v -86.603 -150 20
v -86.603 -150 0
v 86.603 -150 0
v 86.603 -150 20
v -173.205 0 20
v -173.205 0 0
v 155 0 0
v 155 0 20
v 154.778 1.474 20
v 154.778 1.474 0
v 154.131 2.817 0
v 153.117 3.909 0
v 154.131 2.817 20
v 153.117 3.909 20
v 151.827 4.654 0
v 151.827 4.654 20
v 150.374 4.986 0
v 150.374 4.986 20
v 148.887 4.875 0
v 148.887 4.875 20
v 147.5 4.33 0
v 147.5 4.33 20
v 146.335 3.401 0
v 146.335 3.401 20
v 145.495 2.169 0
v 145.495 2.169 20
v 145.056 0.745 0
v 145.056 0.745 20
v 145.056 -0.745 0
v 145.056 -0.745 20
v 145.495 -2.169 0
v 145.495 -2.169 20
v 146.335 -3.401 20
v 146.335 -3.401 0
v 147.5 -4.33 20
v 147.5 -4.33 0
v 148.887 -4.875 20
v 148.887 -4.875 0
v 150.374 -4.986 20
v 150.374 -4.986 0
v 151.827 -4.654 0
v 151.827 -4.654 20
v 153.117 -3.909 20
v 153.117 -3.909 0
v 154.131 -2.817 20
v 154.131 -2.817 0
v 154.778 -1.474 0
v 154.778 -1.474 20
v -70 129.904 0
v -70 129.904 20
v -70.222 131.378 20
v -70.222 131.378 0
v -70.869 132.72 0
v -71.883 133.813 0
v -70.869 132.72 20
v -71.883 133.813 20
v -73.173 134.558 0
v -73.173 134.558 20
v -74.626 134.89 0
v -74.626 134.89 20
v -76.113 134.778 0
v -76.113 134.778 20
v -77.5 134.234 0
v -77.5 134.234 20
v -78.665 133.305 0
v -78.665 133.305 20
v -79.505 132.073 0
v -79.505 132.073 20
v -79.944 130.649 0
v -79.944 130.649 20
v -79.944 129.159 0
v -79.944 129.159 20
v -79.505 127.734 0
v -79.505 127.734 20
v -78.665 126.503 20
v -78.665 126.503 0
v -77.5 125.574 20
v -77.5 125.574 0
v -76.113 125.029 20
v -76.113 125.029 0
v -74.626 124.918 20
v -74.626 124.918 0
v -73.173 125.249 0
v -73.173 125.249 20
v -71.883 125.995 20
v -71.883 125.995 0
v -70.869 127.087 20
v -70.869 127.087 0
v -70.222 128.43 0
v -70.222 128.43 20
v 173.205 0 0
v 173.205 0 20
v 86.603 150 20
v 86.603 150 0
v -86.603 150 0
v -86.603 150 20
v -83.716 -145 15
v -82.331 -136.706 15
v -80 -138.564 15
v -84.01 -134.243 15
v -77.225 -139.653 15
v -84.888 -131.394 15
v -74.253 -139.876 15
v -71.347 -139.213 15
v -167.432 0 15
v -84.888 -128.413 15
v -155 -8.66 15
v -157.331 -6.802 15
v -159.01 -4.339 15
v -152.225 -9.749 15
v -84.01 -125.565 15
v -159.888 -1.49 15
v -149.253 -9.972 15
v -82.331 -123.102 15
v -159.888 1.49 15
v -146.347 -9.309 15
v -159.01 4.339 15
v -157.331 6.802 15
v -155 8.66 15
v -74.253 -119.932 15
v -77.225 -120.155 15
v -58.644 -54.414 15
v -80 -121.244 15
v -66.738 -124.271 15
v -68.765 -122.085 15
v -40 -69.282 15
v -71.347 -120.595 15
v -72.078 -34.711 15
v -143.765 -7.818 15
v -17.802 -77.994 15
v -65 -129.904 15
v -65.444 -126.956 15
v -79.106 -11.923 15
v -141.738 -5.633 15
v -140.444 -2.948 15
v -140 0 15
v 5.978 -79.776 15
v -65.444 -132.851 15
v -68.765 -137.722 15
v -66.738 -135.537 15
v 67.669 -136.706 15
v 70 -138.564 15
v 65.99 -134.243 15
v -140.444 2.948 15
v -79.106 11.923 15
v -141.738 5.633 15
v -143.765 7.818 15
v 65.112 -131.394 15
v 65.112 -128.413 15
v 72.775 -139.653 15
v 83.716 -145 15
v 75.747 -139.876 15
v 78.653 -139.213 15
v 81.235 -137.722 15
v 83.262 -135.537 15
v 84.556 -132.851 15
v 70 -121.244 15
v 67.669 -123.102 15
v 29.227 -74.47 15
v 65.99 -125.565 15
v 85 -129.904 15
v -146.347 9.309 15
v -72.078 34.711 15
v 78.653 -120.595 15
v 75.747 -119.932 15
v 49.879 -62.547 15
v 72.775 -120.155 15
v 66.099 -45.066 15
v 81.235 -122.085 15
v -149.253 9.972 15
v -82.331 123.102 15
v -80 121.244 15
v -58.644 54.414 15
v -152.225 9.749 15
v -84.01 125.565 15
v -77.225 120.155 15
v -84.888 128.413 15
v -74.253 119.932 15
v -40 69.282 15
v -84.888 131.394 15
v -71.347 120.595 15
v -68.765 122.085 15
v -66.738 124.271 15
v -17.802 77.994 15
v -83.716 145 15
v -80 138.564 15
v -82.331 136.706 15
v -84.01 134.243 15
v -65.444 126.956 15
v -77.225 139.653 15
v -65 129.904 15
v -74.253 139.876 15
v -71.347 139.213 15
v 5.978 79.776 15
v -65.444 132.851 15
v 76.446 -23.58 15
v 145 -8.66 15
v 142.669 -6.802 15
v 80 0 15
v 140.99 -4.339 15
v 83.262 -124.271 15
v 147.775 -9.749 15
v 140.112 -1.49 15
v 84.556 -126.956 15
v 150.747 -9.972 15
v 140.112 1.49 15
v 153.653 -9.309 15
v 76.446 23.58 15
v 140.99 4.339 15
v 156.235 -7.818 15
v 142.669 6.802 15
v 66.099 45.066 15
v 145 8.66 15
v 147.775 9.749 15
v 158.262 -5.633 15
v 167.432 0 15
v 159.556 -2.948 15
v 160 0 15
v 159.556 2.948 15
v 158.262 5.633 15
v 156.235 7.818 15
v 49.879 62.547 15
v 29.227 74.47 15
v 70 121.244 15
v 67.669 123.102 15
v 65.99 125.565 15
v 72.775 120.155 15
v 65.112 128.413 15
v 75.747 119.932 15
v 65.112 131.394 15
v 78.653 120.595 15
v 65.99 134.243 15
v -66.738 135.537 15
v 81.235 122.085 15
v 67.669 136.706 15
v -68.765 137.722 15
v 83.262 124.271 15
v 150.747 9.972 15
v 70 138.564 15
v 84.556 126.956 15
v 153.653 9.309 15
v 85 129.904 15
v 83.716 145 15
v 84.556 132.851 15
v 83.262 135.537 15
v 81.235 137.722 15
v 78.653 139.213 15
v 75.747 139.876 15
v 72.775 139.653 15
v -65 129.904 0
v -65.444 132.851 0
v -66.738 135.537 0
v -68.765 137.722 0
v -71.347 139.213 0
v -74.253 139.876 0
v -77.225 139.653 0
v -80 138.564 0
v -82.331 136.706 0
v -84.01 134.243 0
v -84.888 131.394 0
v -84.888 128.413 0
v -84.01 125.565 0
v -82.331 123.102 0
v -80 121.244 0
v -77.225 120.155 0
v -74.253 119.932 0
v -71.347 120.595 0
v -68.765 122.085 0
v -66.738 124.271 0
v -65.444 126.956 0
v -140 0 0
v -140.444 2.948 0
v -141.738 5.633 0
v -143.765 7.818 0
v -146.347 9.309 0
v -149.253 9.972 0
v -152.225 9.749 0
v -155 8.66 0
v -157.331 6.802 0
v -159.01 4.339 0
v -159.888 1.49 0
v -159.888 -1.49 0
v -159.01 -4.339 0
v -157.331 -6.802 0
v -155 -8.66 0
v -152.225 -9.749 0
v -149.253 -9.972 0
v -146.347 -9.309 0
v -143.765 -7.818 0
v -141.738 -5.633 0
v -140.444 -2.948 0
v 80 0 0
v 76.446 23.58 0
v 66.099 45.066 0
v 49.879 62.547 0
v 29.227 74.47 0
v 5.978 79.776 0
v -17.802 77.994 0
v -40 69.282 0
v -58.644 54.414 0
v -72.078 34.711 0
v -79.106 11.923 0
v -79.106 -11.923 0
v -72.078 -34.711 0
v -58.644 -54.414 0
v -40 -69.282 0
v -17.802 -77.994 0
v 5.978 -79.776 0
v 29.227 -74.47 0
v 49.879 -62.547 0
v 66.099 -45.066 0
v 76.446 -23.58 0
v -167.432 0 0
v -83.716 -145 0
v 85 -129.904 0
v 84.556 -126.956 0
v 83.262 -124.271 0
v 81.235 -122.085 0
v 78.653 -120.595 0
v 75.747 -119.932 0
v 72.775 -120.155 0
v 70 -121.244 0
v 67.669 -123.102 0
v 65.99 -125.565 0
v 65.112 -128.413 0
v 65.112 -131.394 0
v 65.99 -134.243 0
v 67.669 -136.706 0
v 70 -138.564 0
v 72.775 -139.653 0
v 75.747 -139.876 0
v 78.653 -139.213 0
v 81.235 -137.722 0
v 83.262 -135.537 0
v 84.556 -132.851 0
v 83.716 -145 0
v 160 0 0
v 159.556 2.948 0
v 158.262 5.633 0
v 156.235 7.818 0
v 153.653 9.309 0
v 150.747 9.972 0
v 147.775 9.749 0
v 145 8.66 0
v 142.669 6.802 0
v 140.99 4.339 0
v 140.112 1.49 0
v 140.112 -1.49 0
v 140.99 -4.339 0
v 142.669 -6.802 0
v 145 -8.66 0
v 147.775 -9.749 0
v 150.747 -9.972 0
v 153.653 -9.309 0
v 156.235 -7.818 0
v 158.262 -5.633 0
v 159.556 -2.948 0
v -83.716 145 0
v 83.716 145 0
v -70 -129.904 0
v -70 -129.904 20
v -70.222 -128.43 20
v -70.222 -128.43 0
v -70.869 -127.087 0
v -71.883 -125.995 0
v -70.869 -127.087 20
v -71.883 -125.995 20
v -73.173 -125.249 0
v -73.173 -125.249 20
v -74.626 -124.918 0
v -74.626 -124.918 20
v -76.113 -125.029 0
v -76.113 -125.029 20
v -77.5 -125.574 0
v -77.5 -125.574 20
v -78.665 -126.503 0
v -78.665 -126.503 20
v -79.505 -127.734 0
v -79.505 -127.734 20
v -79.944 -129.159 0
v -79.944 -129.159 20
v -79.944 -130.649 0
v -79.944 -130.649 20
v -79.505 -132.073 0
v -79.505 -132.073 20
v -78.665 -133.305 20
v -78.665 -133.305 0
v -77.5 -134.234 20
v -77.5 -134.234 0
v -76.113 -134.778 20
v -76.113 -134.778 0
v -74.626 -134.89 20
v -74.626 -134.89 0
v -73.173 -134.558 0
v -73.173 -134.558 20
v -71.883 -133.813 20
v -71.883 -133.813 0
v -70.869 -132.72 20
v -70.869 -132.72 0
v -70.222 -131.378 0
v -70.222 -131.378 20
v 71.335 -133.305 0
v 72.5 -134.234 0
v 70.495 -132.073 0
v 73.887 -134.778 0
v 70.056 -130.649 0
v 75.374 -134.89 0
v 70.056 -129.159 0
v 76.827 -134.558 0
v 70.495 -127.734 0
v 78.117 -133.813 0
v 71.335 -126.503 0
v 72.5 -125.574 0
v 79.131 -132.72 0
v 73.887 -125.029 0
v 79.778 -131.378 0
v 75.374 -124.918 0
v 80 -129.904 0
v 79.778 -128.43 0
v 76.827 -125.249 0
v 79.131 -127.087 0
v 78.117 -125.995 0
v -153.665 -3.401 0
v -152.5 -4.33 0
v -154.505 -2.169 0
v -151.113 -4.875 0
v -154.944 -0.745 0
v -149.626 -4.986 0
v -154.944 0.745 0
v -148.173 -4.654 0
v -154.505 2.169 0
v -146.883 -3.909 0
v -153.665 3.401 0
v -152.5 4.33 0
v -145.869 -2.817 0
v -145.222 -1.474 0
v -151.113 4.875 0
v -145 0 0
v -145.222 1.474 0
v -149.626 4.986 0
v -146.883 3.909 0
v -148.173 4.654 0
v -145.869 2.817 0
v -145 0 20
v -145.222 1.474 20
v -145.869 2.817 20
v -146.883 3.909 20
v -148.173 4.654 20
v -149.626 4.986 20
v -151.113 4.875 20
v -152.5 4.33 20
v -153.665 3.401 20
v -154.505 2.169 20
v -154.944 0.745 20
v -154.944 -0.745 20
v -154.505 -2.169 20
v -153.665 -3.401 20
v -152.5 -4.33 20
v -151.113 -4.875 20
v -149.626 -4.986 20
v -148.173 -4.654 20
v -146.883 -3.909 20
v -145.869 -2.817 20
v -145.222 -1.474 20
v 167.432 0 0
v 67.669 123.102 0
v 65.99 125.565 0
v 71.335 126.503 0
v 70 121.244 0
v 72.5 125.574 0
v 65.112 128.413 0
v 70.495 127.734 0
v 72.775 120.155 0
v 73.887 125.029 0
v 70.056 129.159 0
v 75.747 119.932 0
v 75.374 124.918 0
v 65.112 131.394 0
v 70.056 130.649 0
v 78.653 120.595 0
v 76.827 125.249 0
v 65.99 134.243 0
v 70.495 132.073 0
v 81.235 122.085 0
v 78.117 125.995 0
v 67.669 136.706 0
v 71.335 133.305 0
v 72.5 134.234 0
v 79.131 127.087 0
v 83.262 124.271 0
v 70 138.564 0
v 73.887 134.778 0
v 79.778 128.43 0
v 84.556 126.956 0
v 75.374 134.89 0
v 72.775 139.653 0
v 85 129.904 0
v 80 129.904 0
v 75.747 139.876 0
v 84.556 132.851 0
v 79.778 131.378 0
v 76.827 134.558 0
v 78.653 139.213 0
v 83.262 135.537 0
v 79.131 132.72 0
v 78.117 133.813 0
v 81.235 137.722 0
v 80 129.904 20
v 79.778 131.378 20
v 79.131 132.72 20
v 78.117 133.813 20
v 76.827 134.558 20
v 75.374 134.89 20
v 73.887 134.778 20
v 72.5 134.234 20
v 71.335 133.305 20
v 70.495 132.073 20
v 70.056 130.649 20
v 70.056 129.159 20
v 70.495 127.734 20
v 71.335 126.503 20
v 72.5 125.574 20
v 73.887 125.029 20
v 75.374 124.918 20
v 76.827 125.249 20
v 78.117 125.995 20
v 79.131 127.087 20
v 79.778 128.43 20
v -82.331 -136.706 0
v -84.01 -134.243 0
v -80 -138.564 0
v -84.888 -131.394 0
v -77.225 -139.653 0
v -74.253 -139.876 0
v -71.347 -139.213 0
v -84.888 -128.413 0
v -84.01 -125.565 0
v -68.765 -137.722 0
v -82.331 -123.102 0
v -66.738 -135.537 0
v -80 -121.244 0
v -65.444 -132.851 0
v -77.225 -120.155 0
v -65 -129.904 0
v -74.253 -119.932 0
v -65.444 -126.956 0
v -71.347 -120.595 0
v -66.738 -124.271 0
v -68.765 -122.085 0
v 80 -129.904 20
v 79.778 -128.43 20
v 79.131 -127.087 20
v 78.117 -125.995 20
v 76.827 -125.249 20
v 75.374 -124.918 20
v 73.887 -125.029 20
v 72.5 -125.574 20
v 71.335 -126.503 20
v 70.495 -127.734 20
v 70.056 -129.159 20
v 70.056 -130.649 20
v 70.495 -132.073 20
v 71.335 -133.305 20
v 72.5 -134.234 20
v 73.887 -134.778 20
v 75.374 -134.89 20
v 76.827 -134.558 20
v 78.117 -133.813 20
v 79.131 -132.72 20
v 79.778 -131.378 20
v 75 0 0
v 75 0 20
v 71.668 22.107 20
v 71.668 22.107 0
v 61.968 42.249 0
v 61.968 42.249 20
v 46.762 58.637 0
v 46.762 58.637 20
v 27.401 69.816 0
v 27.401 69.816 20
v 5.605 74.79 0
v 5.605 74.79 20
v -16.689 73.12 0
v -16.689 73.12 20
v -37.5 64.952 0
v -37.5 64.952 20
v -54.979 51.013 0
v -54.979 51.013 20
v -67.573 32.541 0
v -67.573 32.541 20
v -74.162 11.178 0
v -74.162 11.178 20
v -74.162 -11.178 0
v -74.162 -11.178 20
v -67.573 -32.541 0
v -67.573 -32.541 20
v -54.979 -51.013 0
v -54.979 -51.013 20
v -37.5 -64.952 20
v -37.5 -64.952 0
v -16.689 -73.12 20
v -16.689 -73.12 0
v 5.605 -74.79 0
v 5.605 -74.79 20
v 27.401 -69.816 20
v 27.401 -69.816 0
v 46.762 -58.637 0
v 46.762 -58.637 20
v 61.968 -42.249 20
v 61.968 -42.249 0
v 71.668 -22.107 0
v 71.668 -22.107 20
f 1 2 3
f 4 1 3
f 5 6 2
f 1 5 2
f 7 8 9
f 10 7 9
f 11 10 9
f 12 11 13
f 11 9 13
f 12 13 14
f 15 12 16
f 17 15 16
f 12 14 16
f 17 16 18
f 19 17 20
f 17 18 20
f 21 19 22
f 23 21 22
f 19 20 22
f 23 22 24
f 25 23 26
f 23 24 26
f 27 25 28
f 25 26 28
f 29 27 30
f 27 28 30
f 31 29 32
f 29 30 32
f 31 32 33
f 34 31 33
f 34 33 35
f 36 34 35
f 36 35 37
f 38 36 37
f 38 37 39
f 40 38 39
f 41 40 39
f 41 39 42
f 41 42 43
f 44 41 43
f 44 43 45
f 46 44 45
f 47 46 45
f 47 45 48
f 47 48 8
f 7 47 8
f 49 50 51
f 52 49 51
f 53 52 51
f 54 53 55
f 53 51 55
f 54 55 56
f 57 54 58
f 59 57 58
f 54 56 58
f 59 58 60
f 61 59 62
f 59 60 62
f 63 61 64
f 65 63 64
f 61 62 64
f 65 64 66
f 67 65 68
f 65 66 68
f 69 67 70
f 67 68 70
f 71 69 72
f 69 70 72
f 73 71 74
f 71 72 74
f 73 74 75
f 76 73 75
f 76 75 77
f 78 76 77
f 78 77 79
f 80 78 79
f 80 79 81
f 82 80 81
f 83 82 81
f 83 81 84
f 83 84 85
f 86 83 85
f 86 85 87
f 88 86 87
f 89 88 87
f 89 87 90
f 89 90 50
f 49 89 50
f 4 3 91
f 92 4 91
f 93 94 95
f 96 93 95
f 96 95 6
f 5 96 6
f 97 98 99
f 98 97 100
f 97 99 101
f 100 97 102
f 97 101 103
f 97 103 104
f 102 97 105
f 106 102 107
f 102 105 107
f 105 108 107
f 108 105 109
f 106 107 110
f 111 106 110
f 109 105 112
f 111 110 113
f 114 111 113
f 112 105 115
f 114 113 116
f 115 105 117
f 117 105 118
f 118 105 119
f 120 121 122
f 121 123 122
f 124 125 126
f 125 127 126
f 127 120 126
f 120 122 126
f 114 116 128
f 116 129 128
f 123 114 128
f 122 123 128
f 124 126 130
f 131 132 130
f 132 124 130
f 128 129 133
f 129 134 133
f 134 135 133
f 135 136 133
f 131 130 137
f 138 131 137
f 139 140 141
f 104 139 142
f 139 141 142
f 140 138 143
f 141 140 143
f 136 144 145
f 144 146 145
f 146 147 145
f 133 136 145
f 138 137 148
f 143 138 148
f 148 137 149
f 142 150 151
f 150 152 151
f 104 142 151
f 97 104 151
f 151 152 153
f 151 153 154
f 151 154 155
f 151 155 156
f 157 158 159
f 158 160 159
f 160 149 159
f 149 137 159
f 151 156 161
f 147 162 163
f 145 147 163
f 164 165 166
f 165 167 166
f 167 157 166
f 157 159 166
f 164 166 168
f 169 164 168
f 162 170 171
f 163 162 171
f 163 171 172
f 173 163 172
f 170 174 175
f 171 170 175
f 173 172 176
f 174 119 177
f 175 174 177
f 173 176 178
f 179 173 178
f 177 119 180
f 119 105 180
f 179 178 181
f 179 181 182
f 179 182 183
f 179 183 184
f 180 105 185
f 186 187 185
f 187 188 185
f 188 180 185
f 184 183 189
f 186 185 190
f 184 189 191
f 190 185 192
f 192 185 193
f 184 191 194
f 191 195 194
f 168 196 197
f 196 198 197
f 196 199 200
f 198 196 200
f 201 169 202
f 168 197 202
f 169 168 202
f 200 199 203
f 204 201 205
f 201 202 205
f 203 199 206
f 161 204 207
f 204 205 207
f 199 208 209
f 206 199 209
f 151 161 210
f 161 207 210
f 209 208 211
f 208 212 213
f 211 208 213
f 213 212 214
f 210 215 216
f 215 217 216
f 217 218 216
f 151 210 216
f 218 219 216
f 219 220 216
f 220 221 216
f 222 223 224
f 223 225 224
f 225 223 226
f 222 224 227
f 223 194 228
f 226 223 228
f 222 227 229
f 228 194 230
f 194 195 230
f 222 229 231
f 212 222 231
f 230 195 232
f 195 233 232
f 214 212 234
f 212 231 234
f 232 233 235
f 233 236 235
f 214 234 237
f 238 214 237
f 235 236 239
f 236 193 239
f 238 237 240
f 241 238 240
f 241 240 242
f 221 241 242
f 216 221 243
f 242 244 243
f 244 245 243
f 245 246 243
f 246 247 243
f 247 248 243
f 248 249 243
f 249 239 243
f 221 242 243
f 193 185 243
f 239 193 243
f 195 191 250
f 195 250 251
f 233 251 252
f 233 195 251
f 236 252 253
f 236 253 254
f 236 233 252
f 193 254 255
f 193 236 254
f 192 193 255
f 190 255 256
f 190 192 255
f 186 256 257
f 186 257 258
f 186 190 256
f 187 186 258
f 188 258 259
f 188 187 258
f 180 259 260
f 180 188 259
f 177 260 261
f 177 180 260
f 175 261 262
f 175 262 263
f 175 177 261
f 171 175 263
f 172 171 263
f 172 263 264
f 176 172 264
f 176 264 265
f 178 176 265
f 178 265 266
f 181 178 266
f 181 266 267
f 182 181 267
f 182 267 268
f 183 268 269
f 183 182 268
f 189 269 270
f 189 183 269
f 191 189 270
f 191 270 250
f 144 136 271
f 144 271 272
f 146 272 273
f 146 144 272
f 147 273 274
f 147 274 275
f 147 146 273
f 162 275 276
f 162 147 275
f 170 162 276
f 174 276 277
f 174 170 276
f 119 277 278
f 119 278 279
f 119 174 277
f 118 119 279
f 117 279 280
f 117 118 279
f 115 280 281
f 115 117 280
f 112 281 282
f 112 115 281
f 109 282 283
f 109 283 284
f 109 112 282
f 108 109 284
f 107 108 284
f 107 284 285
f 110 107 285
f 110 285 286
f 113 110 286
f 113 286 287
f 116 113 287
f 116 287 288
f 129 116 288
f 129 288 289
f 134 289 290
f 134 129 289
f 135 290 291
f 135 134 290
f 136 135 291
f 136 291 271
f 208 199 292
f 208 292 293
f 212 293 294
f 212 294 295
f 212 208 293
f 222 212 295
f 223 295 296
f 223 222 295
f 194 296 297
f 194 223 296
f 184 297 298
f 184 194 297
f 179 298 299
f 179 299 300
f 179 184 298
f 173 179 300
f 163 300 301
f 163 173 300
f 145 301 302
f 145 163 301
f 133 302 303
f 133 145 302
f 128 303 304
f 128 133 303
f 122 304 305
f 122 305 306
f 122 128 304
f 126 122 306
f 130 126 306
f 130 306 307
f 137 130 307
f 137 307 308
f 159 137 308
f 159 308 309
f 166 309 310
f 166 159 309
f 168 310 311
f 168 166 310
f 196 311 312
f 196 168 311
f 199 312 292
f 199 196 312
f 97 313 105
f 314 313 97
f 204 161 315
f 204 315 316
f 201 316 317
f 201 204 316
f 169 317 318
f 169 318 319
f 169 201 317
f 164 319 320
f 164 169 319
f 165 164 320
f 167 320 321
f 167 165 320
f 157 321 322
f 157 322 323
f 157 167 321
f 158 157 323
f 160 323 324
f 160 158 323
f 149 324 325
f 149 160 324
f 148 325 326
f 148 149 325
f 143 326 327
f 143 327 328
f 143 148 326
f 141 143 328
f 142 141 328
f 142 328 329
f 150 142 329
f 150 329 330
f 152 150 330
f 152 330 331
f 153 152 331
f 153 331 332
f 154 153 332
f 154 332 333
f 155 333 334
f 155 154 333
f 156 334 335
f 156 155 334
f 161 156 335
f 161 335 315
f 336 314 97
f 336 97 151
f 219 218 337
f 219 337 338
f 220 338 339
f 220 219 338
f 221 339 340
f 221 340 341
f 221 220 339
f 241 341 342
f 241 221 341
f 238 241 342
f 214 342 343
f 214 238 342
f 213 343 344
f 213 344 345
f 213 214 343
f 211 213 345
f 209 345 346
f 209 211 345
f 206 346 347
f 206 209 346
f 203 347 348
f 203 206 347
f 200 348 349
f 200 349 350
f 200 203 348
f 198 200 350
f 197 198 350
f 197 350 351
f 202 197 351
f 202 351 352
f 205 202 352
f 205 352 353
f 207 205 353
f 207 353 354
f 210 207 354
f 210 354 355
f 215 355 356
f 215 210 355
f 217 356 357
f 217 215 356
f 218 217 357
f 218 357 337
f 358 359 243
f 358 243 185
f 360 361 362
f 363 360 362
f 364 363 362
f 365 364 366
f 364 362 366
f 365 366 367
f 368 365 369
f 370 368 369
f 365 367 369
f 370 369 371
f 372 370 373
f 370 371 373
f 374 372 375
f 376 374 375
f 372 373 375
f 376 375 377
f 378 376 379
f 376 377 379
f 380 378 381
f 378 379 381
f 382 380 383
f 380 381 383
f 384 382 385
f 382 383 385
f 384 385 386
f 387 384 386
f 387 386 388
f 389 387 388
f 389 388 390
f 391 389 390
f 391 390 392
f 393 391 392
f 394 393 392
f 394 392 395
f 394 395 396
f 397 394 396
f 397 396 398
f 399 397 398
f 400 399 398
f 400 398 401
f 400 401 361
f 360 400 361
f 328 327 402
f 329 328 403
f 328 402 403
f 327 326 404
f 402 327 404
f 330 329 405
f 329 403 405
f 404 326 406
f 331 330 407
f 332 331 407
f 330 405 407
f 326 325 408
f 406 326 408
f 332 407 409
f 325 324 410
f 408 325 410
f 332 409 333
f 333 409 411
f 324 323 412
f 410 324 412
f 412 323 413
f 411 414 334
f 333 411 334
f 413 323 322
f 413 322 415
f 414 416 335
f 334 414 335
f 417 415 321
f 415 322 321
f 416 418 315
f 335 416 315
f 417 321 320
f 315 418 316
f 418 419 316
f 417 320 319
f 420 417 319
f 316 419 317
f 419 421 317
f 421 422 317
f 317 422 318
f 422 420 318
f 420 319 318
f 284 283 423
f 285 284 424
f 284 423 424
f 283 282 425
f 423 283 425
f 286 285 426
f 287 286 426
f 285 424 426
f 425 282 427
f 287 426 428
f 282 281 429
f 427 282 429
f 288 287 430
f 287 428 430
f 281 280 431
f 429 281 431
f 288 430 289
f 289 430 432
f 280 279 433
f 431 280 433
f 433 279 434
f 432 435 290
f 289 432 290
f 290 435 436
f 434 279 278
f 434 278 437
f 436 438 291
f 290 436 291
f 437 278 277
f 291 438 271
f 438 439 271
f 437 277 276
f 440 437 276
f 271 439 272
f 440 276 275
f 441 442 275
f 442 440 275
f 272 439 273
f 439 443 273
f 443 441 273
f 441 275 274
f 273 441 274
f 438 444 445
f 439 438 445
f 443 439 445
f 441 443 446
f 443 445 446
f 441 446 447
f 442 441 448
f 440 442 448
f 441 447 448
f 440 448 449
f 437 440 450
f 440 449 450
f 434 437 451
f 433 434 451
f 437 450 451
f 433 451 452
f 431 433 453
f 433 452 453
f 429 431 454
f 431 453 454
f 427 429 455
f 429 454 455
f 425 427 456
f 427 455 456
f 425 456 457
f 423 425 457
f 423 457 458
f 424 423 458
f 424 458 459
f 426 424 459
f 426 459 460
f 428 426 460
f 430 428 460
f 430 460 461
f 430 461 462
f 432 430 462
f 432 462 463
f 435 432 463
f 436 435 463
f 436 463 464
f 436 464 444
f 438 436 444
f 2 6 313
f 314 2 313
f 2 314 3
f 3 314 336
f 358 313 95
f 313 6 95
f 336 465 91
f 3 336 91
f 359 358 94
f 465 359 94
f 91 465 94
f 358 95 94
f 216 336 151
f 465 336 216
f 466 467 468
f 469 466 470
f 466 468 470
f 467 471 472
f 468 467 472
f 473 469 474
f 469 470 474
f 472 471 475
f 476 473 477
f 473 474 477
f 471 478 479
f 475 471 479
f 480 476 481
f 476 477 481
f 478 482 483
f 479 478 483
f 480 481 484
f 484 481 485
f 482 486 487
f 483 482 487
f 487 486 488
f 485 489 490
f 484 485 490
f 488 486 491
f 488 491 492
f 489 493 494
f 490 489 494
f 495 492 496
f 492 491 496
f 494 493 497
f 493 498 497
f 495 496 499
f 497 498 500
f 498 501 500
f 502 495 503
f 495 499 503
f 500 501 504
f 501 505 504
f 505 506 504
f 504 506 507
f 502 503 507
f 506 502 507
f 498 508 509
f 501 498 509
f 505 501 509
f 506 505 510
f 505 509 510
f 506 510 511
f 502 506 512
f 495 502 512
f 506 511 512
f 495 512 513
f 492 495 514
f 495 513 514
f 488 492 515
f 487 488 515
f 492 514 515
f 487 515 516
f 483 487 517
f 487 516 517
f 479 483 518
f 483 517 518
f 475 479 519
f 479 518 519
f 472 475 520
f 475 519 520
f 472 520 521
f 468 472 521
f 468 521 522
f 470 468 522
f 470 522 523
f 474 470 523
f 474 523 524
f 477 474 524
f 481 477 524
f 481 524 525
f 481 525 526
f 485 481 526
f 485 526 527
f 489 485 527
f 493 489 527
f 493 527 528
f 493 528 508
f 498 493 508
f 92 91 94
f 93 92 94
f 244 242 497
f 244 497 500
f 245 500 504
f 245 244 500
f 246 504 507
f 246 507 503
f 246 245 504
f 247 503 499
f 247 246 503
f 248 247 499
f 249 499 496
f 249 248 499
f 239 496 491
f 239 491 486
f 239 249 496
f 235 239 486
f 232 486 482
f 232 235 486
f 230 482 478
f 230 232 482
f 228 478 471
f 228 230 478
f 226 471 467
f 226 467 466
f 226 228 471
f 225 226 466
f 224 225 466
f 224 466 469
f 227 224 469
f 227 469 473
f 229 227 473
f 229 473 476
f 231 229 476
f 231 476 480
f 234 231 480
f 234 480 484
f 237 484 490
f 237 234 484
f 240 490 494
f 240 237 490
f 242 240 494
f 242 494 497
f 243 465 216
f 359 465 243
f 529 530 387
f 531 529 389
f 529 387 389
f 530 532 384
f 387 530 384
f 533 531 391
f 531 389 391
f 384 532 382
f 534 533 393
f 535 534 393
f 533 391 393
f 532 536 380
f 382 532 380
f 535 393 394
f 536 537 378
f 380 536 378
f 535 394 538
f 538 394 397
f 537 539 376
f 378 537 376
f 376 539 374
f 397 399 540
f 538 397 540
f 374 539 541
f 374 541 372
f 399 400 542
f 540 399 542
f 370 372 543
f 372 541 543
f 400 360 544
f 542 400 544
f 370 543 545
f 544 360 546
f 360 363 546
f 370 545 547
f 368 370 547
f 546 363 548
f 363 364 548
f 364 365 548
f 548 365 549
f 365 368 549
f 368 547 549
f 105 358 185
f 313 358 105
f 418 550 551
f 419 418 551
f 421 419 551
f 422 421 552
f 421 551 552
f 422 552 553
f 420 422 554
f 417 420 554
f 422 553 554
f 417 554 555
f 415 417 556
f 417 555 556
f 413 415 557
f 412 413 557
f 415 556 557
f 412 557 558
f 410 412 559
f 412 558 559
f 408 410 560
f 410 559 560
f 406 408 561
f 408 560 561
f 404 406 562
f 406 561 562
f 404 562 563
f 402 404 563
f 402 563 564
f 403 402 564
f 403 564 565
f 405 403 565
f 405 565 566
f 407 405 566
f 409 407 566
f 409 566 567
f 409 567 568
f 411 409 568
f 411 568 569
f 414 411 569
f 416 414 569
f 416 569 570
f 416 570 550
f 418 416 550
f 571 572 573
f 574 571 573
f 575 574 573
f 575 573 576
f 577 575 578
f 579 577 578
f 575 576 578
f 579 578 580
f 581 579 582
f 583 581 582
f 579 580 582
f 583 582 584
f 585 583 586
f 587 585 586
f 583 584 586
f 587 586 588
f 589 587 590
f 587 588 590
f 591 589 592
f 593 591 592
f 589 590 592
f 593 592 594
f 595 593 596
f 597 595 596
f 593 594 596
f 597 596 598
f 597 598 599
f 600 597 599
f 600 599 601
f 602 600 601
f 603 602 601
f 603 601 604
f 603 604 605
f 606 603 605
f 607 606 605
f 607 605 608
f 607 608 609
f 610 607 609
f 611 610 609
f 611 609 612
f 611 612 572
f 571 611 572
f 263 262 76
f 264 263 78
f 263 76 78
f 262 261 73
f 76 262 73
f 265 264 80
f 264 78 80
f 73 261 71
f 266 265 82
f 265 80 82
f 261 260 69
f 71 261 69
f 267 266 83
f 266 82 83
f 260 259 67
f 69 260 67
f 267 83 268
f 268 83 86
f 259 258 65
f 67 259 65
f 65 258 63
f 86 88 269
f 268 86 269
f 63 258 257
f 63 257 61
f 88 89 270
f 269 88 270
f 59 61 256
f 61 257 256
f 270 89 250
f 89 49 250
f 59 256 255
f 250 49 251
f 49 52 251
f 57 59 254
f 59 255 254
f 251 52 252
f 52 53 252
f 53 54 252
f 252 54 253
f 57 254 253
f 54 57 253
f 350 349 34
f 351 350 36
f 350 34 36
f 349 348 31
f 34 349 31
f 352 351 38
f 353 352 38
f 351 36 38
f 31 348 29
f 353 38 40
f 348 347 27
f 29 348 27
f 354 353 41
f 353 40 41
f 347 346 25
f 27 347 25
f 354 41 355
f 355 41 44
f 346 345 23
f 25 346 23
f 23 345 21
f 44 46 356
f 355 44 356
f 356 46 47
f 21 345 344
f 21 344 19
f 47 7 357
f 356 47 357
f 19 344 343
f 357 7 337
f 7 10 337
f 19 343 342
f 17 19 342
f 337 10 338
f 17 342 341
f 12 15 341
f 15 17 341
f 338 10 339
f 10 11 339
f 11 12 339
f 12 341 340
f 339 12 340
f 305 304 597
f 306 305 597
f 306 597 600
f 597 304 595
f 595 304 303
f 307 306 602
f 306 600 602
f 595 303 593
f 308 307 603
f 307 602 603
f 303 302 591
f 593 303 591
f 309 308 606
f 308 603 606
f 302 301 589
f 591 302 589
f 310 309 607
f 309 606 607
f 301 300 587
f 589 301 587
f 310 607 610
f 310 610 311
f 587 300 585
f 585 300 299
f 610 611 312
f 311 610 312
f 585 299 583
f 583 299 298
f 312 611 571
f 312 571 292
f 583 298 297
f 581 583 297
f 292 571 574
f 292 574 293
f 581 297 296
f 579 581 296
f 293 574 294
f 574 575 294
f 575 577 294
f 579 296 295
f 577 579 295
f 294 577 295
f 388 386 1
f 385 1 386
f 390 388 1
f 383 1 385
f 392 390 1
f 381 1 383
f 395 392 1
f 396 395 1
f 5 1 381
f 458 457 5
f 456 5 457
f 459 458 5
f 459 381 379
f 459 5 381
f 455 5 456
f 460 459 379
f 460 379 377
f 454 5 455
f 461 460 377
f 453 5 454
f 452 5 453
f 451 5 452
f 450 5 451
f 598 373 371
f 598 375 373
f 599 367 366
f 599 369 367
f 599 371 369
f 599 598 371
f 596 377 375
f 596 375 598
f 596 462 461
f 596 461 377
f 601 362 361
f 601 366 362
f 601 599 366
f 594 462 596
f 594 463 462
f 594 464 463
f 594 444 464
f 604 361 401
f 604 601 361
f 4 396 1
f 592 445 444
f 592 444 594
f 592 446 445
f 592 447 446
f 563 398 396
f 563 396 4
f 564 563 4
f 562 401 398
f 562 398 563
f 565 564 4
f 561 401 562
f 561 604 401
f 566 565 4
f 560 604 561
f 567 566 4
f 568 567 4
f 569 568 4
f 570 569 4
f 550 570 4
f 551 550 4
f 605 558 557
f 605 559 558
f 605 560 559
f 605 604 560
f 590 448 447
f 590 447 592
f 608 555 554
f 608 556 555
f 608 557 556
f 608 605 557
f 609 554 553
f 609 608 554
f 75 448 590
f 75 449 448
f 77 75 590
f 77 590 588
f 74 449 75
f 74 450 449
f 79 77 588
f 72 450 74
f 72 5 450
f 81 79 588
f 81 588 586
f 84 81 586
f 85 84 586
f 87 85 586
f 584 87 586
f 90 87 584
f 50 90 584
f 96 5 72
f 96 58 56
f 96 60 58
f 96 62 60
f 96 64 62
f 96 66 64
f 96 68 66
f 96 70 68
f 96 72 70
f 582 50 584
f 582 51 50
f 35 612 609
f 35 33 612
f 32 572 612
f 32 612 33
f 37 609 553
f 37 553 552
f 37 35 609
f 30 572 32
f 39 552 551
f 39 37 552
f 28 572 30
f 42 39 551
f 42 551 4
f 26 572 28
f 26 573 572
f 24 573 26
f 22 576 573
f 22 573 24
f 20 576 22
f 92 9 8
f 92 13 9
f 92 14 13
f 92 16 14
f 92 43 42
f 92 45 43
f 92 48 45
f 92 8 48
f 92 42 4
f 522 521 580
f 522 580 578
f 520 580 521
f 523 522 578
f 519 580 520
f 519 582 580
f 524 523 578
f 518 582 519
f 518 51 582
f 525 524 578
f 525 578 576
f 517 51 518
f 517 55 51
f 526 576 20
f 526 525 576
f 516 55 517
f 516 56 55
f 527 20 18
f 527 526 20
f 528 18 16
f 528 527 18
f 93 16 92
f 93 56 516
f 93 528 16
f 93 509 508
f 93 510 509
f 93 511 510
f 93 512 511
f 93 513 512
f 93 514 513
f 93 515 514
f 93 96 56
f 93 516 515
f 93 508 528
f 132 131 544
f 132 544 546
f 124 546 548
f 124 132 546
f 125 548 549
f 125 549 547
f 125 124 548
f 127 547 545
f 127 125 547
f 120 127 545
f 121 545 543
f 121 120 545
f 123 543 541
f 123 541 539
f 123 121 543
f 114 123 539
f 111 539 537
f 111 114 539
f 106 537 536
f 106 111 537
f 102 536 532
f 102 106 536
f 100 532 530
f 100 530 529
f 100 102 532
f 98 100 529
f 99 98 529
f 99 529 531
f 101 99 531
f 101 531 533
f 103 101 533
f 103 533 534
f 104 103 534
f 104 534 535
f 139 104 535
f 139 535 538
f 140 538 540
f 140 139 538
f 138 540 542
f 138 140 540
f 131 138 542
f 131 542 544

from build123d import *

# Parameters (mm, degrees)
F1_DEPTH = 20
F2_R     = 75
F3_DEPTH = 20.001
F4_R     = 5
F5_DEPTH = 20.001
F6_DEPTH = 25
F7_T     = -5


with BuildPart() as f1:
    # F0 (on Top) → F1 (new body)
    with BuildSketch(Plane.XY):
        Polygon((86.6025403784, -150), (173.2050807569, 0), (86.6025403784, 150), (-86.6025403784, 150), (-173.2050807569, 0), (-86.6025403784, -150), align=None)
    extrude(amount=F1_DEPTH)

    # F2 (on face) → F3 (cut, through all)
    with BuildSketch(Plane.XY.offset(20)):
        Circle(F2_R)
    extrude(amount=-F3_DEPTH, mode=Mode.SUBTRACT)

    # F4 (on face) → F5 (cut, through all)
    with BuildSketch(Plane.XY.offset(20)):
        with Locations((75, 129.9038105677)):
            Circle(F4_R)
        with Locations((-75, -129.9038105677)):
            Circle(F4_R)
        with Locations((-150, 0)):
            Circle(F4_R)
        with Locations((150, 0)):
            Circle(F4_R)
        with Locations((75, -129.9038105677)):
            Circle(F4_R)
    extrude(amount=-F5_DEPTH, mode=Mode.SUBTRACT)

    # F4 (on face) → F6 (cut)
    with BuildSketch(Plane.XY.offset(20)):
        with Locations((-75, 129.9038105677)):
            Circle(F4_R)
        with Locations((75, 129.9038105677)):
            Circle(F4_R)
        with Locations((-75, -129.9038105677)):
            Circle(F4_R)
        with Locations((-150, 0)):
            Circle(F4_R)
        with Locations((150, 0)):
            Circle(F4_R)
        with Locations((75, -129.9038105677)):
            Circle(F4_R)
    extrude(amount=-F6_DEPTH, mode=Mode.SUBTRACT)

    # F7
    f7_openings = [f1.faces().sort_by_distance(p)[0] for p in [
        (0, -145.417424, 0),
    ]]
    offset(amount=F7_T, openings=f7_openings)


solid = f1.part
